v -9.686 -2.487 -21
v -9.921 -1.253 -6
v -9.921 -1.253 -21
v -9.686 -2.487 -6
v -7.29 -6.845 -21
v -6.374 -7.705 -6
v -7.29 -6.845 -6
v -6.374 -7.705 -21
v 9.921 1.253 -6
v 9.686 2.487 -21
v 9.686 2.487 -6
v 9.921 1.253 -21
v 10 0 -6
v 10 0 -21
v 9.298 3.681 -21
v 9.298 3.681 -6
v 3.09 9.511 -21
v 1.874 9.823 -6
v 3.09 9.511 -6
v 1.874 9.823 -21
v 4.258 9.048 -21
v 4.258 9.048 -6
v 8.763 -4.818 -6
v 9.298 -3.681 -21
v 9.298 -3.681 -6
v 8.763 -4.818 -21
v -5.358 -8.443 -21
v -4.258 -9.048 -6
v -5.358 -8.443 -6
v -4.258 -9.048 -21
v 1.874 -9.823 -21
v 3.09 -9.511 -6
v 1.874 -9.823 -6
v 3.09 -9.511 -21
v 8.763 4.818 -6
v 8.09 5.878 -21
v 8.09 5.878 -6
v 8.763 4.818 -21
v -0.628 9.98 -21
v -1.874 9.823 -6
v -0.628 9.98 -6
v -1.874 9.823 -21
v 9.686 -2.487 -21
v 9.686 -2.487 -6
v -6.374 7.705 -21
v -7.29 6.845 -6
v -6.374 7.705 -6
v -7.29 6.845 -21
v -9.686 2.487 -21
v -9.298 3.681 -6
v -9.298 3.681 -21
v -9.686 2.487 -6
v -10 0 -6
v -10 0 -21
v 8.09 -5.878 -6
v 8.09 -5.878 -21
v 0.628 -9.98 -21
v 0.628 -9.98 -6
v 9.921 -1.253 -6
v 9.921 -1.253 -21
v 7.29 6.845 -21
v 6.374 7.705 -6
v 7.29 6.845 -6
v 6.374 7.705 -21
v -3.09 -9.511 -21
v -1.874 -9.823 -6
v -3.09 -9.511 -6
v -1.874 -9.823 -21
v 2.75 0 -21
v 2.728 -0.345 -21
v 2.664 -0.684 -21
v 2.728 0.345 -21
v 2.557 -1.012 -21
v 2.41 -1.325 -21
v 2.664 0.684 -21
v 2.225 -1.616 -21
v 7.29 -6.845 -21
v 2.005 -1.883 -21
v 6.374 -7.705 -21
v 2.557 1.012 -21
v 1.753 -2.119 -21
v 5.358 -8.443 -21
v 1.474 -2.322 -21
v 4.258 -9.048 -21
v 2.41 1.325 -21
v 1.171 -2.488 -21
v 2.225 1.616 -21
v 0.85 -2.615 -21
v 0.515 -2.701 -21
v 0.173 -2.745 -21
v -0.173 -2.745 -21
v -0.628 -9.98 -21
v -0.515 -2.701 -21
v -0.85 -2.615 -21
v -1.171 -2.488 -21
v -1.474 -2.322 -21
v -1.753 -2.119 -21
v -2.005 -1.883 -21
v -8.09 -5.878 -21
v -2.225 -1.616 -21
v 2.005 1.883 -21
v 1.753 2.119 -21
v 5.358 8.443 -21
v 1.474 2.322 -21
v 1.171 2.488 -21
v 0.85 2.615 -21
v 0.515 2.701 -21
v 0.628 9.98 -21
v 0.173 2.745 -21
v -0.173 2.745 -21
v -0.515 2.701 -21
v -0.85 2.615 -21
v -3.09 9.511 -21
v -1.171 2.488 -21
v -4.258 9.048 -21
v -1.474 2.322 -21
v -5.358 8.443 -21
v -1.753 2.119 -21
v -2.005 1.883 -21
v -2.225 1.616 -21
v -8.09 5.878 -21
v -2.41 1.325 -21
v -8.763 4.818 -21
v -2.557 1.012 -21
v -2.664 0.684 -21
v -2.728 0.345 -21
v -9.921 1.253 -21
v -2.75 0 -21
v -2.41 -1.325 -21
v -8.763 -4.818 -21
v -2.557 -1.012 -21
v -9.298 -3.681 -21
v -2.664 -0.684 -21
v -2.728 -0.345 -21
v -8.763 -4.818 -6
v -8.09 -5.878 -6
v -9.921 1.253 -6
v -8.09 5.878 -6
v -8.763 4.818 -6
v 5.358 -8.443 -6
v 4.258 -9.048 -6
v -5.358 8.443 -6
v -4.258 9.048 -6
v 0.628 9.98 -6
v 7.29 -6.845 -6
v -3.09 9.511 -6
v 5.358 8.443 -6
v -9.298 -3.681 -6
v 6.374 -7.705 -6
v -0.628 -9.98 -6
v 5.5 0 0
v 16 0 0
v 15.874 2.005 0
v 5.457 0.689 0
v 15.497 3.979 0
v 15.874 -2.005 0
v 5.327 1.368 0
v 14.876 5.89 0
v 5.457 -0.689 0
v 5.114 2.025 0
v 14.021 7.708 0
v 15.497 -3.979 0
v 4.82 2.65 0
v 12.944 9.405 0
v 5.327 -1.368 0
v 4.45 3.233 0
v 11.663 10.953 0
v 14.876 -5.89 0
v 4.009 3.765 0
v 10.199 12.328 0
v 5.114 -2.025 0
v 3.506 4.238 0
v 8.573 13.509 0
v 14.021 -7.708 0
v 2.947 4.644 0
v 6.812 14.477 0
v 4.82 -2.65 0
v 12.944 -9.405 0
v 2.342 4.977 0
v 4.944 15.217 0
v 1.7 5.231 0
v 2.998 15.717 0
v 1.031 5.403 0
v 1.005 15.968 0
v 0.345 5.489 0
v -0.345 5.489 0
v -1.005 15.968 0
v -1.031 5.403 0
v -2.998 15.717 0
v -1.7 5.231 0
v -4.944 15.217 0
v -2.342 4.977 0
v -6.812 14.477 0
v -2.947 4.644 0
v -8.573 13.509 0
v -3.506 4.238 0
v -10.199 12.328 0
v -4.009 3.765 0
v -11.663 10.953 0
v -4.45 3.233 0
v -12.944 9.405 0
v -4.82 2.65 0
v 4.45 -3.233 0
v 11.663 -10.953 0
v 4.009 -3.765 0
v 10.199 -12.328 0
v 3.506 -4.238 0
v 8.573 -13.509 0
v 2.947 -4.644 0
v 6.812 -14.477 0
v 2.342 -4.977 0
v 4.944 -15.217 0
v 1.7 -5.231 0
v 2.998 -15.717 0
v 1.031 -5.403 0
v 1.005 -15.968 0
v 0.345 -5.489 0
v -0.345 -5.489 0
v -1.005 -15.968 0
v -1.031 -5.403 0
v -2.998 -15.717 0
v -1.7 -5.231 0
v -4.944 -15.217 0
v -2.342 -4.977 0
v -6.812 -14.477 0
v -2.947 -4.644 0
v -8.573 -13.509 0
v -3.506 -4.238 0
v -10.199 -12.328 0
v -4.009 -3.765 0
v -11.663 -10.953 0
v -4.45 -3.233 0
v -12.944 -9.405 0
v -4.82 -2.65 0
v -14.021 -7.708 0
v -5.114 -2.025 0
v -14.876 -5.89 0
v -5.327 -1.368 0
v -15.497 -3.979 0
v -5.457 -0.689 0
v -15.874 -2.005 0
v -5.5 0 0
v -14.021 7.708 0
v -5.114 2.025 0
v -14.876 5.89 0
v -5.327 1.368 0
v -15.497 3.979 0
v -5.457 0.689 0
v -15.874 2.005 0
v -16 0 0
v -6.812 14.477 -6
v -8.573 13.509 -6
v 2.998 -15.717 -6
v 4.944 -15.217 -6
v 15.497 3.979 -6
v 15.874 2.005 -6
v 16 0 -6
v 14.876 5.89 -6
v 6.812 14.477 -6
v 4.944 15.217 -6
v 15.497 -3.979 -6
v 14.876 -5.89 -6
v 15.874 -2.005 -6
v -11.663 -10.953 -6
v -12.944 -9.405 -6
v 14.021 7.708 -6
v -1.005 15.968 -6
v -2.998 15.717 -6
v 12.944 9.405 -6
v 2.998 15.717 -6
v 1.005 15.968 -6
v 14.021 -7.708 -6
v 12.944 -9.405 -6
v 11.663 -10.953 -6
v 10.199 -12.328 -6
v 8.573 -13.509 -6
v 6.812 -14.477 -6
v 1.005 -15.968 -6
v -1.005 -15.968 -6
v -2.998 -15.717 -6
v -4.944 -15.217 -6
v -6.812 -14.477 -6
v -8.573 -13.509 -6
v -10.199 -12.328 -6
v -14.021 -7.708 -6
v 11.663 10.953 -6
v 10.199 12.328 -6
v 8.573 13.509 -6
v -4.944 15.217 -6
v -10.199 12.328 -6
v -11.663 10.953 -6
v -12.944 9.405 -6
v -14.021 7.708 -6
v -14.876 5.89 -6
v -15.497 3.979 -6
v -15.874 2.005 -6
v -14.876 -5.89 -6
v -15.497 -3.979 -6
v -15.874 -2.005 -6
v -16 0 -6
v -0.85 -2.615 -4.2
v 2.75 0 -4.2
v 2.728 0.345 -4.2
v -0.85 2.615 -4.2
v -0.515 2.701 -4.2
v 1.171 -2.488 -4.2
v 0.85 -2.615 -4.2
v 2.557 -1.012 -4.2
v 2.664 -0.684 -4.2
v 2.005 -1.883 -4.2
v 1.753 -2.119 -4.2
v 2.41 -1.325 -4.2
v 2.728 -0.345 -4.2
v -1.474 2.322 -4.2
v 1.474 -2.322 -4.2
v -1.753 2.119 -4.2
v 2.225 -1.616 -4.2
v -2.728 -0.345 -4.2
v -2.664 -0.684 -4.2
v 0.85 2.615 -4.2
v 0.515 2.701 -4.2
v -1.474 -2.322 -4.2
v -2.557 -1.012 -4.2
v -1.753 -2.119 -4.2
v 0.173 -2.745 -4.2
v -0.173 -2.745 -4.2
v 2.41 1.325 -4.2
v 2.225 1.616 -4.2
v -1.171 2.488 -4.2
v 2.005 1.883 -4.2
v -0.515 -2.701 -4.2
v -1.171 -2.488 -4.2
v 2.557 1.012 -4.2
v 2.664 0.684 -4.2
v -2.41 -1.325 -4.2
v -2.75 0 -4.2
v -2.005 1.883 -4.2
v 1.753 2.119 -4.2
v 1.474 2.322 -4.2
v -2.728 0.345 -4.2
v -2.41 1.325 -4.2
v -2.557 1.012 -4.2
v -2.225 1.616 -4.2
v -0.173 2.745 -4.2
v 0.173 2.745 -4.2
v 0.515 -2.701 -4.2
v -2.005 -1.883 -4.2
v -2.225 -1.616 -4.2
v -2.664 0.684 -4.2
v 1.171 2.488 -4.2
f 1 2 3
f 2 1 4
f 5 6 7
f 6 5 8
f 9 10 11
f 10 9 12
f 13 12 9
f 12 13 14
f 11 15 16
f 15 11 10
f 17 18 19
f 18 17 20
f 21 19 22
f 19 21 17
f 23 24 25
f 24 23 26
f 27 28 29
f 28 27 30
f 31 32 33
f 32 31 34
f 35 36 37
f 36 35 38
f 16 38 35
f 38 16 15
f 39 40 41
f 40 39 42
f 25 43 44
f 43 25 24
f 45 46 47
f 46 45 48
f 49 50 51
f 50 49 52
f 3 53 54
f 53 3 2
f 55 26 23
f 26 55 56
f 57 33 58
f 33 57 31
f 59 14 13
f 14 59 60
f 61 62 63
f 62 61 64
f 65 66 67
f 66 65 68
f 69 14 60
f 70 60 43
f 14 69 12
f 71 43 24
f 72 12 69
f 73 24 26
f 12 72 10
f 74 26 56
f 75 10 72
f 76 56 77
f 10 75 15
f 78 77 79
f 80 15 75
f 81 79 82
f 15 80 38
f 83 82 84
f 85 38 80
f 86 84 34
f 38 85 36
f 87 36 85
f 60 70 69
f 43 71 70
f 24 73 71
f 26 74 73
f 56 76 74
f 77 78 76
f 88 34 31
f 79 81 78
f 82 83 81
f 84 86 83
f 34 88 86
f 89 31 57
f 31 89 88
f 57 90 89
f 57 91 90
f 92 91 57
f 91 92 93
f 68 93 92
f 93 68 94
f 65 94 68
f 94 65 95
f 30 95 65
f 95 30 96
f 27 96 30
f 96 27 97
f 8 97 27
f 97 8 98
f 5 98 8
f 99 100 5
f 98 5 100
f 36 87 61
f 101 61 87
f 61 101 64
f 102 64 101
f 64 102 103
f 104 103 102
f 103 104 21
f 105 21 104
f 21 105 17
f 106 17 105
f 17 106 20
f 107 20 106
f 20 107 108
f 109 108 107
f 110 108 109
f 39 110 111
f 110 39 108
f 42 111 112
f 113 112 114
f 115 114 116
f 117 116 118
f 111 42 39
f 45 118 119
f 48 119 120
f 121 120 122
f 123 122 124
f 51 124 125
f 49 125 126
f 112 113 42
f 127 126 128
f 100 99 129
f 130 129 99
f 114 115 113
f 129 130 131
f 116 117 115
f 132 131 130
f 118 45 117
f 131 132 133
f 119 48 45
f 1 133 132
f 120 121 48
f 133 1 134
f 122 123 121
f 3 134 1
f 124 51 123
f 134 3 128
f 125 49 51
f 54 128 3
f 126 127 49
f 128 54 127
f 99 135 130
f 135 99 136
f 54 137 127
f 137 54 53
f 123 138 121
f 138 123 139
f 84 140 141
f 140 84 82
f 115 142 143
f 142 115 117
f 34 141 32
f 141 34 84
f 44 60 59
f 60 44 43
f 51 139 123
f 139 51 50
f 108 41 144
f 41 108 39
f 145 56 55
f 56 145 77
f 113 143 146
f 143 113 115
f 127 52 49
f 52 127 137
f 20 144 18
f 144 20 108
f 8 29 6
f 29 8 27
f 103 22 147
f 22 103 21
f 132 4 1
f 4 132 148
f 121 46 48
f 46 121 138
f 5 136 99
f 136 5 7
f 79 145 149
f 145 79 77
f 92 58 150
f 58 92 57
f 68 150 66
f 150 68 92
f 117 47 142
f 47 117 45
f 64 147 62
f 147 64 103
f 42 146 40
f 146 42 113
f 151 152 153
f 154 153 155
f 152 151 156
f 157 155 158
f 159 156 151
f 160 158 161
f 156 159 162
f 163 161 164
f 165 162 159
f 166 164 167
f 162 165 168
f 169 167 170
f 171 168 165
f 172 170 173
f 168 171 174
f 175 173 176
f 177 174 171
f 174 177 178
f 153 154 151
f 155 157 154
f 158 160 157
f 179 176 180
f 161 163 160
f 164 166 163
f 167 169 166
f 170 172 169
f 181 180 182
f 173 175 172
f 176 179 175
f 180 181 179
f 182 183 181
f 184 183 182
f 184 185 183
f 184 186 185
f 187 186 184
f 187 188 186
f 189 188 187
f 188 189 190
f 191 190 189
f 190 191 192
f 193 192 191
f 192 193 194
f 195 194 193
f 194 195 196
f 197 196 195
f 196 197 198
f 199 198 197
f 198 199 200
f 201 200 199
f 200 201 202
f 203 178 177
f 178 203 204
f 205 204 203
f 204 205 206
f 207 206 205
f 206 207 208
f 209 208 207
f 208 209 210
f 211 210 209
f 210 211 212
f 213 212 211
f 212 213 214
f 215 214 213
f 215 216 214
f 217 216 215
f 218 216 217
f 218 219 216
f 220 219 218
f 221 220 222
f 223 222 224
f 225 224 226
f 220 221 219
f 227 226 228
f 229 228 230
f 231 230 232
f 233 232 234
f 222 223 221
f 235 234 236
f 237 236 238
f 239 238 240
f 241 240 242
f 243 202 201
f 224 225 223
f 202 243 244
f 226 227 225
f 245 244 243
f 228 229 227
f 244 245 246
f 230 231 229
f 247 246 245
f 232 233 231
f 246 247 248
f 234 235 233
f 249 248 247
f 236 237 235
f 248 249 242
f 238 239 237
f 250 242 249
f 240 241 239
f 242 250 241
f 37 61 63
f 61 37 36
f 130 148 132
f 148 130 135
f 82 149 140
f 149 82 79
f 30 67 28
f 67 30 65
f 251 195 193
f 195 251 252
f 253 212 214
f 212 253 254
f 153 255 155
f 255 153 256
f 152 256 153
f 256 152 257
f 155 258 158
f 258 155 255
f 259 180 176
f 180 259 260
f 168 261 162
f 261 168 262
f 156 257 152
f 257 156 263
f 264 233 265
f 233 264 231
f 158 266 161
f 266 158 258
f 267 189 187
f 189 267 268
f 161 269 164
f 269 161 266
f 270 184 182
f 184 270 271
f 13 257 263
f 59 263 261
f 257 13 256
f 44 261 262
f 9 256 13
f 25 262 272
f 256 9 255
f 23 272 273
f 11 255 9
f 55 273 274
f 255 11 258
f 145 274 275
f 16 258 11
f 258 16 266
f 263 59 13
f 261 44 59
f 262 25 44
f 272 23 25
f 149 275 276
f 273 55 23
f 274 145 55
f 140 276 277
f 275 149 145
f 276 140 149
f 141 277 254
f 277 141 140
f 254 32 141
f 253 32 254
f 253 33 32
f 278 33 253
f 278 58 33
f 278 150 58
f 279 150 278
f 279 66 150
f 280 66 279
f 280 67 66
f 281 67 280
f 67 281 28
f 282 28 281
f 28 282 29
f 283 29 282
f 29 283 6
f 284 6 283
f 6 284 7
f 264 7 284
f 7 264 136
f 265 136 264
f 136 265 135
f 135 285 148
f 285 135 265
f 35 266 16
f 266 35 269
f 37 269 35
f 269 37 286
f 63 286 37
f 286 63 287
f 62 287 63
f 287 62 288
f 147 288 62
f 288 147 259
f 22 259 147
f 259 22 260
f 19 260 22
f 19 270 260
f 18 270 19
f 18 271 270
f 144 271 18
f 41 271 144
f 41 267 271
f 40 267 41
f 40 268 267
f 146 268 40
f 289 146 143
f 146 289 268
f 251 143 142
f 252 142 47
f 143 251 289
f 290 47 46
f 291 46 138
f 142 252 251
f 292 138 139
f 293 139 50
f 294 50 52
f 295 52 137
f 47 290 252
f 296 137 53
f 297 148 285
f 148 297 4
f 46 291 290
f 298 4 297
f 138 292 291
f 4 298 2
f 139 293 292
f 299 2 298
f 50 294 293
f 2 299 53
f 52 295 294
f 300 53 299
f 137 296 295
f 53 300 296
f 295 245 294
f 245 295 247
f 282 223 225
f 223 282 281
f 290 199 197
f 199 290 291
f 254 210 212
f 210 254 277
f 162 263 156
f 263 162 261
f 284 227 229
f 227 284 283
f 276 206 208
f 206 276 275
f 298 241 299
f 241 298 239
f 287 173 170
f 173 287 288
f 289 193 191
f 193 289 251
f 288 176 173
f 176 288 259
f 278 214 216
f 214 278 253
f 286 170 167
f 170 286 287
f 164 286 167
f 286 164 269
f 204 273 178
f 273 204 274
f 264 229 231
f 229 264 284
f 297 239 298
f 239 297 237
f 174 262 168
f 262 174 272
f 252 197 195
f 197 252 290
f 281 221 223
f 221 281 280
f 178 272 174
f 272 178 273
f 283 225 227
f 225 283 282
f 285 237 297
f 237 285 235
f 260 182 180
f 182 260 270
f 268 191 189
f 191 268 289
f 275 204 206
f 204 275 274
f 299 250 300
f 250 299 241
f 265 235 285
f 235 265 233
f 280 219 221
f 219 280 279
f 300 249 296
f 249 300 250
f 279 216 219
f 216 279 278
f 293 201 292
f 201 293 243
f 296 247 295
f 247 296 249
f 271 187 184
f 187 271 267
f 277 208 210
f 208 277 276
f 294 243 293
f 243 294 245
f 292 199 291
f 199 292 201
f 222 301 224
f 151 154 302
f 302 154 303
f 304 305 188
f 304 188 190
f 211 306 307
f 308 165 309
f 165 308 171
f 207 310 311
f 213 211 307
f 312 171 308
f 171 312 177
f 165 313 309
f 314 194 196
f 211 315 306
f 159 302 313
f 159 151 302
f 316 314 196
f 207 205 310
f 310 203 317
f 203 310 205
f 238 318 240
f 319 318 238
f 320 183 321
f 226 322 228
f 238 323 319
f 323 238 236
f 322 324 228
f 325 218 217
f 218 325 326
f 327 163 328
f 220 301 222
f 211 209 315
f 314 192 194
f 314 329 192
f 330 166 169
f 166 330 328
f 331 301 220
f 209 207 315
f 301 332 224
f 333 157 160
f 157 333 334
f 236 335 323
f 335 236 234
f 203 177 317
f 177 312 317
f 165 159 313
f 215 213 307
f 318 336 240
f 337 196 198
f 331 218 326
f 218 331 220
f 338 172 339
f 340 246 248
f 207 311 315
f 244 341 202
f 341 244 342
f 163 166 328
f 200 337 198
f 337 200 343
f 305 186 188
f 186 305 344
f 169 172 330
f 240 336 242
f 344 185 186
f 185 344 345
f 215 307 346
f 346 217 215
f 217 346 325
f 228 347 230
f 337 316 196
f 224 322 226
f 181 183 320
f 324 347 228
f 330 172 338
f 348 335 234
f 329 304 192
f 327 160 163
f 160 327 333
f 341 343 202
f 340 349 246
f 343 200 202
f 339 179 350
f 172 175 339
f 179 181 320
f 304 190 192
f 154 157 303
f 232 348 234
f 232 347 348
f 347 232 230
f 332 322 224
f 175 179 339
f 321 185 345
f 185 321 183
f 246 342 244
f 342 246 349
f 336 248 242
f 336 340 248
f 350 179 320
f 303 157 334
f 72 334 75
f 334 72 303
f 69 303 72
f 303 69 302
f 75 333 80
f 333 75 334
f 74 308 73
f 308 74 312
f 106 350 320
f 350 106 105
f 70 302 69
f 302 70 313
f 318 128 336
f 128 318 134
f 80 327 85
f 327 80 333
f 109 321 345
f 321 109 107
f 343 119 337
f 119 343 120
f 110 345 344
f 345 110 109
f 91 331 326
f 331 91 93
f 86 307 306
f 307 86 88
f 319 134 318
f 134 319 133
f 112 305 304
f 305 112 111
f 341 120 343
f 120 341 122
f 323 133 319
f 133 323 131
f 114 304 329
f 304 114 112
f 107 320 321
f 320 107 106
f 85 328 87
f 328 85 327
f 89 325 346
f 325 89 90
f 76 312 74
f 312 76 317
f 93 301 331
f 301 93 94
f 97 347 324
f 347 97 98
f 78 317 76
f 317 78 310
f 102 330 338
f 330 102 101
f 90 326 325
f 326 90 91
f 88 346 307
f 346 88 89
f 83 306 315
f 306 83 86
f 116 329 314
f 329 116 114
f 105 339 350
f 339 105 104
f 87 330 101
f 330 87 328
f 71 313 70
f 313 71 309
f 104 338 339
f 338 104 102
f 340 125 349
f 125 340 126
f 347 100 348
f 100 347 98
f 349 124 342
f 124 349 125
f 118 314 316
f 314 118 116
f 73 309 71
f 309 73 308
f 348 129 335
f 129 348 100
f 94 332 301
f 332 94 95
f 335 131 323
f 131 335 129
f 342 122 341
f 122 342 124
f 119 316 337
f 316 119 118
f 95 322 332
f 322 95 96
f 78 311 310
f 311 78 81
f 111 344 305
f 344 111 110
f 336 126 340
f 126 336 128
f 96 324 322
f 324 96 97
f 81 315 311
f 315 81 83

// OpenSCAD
$fn = 50;


difference() {
	union() {
		translate(v = [0, 0, -21.0000000000]) {
			cylinder(h = 21, r = 10.0000000000);
		}
		translate(v = [0, 0, -6.0000000000]) {
			cylinder(h = 6, r = 16.0000000000);
		}
	}
	union() {
		translate(v = [0, 0, 0]) {
			rotate(a = [0, 0, 0]) {
				difference() {
					union() {
						#translate(v = [0, 0, -21.0000000000]) {
							cylinder(h = 21, r = 2.2500000000);
						}
						#translate(v = [0, 0, -4.2000000000]) {
							cylinder(h = 4.2000000000, r1 = 2.7500000000, r2 = 5.5000000000);
						}
						#translate(v = [0, 0, -21.0000000000]) {
							cylinder(h = 21, r = 2.7500000000);
						}
						#translate(v = [0, 0, -21.0000000000]) {
							cylinder(h = 21, r = 2.2500000000);
						}
					}
					union();
				}
			}
		}
	}
}
